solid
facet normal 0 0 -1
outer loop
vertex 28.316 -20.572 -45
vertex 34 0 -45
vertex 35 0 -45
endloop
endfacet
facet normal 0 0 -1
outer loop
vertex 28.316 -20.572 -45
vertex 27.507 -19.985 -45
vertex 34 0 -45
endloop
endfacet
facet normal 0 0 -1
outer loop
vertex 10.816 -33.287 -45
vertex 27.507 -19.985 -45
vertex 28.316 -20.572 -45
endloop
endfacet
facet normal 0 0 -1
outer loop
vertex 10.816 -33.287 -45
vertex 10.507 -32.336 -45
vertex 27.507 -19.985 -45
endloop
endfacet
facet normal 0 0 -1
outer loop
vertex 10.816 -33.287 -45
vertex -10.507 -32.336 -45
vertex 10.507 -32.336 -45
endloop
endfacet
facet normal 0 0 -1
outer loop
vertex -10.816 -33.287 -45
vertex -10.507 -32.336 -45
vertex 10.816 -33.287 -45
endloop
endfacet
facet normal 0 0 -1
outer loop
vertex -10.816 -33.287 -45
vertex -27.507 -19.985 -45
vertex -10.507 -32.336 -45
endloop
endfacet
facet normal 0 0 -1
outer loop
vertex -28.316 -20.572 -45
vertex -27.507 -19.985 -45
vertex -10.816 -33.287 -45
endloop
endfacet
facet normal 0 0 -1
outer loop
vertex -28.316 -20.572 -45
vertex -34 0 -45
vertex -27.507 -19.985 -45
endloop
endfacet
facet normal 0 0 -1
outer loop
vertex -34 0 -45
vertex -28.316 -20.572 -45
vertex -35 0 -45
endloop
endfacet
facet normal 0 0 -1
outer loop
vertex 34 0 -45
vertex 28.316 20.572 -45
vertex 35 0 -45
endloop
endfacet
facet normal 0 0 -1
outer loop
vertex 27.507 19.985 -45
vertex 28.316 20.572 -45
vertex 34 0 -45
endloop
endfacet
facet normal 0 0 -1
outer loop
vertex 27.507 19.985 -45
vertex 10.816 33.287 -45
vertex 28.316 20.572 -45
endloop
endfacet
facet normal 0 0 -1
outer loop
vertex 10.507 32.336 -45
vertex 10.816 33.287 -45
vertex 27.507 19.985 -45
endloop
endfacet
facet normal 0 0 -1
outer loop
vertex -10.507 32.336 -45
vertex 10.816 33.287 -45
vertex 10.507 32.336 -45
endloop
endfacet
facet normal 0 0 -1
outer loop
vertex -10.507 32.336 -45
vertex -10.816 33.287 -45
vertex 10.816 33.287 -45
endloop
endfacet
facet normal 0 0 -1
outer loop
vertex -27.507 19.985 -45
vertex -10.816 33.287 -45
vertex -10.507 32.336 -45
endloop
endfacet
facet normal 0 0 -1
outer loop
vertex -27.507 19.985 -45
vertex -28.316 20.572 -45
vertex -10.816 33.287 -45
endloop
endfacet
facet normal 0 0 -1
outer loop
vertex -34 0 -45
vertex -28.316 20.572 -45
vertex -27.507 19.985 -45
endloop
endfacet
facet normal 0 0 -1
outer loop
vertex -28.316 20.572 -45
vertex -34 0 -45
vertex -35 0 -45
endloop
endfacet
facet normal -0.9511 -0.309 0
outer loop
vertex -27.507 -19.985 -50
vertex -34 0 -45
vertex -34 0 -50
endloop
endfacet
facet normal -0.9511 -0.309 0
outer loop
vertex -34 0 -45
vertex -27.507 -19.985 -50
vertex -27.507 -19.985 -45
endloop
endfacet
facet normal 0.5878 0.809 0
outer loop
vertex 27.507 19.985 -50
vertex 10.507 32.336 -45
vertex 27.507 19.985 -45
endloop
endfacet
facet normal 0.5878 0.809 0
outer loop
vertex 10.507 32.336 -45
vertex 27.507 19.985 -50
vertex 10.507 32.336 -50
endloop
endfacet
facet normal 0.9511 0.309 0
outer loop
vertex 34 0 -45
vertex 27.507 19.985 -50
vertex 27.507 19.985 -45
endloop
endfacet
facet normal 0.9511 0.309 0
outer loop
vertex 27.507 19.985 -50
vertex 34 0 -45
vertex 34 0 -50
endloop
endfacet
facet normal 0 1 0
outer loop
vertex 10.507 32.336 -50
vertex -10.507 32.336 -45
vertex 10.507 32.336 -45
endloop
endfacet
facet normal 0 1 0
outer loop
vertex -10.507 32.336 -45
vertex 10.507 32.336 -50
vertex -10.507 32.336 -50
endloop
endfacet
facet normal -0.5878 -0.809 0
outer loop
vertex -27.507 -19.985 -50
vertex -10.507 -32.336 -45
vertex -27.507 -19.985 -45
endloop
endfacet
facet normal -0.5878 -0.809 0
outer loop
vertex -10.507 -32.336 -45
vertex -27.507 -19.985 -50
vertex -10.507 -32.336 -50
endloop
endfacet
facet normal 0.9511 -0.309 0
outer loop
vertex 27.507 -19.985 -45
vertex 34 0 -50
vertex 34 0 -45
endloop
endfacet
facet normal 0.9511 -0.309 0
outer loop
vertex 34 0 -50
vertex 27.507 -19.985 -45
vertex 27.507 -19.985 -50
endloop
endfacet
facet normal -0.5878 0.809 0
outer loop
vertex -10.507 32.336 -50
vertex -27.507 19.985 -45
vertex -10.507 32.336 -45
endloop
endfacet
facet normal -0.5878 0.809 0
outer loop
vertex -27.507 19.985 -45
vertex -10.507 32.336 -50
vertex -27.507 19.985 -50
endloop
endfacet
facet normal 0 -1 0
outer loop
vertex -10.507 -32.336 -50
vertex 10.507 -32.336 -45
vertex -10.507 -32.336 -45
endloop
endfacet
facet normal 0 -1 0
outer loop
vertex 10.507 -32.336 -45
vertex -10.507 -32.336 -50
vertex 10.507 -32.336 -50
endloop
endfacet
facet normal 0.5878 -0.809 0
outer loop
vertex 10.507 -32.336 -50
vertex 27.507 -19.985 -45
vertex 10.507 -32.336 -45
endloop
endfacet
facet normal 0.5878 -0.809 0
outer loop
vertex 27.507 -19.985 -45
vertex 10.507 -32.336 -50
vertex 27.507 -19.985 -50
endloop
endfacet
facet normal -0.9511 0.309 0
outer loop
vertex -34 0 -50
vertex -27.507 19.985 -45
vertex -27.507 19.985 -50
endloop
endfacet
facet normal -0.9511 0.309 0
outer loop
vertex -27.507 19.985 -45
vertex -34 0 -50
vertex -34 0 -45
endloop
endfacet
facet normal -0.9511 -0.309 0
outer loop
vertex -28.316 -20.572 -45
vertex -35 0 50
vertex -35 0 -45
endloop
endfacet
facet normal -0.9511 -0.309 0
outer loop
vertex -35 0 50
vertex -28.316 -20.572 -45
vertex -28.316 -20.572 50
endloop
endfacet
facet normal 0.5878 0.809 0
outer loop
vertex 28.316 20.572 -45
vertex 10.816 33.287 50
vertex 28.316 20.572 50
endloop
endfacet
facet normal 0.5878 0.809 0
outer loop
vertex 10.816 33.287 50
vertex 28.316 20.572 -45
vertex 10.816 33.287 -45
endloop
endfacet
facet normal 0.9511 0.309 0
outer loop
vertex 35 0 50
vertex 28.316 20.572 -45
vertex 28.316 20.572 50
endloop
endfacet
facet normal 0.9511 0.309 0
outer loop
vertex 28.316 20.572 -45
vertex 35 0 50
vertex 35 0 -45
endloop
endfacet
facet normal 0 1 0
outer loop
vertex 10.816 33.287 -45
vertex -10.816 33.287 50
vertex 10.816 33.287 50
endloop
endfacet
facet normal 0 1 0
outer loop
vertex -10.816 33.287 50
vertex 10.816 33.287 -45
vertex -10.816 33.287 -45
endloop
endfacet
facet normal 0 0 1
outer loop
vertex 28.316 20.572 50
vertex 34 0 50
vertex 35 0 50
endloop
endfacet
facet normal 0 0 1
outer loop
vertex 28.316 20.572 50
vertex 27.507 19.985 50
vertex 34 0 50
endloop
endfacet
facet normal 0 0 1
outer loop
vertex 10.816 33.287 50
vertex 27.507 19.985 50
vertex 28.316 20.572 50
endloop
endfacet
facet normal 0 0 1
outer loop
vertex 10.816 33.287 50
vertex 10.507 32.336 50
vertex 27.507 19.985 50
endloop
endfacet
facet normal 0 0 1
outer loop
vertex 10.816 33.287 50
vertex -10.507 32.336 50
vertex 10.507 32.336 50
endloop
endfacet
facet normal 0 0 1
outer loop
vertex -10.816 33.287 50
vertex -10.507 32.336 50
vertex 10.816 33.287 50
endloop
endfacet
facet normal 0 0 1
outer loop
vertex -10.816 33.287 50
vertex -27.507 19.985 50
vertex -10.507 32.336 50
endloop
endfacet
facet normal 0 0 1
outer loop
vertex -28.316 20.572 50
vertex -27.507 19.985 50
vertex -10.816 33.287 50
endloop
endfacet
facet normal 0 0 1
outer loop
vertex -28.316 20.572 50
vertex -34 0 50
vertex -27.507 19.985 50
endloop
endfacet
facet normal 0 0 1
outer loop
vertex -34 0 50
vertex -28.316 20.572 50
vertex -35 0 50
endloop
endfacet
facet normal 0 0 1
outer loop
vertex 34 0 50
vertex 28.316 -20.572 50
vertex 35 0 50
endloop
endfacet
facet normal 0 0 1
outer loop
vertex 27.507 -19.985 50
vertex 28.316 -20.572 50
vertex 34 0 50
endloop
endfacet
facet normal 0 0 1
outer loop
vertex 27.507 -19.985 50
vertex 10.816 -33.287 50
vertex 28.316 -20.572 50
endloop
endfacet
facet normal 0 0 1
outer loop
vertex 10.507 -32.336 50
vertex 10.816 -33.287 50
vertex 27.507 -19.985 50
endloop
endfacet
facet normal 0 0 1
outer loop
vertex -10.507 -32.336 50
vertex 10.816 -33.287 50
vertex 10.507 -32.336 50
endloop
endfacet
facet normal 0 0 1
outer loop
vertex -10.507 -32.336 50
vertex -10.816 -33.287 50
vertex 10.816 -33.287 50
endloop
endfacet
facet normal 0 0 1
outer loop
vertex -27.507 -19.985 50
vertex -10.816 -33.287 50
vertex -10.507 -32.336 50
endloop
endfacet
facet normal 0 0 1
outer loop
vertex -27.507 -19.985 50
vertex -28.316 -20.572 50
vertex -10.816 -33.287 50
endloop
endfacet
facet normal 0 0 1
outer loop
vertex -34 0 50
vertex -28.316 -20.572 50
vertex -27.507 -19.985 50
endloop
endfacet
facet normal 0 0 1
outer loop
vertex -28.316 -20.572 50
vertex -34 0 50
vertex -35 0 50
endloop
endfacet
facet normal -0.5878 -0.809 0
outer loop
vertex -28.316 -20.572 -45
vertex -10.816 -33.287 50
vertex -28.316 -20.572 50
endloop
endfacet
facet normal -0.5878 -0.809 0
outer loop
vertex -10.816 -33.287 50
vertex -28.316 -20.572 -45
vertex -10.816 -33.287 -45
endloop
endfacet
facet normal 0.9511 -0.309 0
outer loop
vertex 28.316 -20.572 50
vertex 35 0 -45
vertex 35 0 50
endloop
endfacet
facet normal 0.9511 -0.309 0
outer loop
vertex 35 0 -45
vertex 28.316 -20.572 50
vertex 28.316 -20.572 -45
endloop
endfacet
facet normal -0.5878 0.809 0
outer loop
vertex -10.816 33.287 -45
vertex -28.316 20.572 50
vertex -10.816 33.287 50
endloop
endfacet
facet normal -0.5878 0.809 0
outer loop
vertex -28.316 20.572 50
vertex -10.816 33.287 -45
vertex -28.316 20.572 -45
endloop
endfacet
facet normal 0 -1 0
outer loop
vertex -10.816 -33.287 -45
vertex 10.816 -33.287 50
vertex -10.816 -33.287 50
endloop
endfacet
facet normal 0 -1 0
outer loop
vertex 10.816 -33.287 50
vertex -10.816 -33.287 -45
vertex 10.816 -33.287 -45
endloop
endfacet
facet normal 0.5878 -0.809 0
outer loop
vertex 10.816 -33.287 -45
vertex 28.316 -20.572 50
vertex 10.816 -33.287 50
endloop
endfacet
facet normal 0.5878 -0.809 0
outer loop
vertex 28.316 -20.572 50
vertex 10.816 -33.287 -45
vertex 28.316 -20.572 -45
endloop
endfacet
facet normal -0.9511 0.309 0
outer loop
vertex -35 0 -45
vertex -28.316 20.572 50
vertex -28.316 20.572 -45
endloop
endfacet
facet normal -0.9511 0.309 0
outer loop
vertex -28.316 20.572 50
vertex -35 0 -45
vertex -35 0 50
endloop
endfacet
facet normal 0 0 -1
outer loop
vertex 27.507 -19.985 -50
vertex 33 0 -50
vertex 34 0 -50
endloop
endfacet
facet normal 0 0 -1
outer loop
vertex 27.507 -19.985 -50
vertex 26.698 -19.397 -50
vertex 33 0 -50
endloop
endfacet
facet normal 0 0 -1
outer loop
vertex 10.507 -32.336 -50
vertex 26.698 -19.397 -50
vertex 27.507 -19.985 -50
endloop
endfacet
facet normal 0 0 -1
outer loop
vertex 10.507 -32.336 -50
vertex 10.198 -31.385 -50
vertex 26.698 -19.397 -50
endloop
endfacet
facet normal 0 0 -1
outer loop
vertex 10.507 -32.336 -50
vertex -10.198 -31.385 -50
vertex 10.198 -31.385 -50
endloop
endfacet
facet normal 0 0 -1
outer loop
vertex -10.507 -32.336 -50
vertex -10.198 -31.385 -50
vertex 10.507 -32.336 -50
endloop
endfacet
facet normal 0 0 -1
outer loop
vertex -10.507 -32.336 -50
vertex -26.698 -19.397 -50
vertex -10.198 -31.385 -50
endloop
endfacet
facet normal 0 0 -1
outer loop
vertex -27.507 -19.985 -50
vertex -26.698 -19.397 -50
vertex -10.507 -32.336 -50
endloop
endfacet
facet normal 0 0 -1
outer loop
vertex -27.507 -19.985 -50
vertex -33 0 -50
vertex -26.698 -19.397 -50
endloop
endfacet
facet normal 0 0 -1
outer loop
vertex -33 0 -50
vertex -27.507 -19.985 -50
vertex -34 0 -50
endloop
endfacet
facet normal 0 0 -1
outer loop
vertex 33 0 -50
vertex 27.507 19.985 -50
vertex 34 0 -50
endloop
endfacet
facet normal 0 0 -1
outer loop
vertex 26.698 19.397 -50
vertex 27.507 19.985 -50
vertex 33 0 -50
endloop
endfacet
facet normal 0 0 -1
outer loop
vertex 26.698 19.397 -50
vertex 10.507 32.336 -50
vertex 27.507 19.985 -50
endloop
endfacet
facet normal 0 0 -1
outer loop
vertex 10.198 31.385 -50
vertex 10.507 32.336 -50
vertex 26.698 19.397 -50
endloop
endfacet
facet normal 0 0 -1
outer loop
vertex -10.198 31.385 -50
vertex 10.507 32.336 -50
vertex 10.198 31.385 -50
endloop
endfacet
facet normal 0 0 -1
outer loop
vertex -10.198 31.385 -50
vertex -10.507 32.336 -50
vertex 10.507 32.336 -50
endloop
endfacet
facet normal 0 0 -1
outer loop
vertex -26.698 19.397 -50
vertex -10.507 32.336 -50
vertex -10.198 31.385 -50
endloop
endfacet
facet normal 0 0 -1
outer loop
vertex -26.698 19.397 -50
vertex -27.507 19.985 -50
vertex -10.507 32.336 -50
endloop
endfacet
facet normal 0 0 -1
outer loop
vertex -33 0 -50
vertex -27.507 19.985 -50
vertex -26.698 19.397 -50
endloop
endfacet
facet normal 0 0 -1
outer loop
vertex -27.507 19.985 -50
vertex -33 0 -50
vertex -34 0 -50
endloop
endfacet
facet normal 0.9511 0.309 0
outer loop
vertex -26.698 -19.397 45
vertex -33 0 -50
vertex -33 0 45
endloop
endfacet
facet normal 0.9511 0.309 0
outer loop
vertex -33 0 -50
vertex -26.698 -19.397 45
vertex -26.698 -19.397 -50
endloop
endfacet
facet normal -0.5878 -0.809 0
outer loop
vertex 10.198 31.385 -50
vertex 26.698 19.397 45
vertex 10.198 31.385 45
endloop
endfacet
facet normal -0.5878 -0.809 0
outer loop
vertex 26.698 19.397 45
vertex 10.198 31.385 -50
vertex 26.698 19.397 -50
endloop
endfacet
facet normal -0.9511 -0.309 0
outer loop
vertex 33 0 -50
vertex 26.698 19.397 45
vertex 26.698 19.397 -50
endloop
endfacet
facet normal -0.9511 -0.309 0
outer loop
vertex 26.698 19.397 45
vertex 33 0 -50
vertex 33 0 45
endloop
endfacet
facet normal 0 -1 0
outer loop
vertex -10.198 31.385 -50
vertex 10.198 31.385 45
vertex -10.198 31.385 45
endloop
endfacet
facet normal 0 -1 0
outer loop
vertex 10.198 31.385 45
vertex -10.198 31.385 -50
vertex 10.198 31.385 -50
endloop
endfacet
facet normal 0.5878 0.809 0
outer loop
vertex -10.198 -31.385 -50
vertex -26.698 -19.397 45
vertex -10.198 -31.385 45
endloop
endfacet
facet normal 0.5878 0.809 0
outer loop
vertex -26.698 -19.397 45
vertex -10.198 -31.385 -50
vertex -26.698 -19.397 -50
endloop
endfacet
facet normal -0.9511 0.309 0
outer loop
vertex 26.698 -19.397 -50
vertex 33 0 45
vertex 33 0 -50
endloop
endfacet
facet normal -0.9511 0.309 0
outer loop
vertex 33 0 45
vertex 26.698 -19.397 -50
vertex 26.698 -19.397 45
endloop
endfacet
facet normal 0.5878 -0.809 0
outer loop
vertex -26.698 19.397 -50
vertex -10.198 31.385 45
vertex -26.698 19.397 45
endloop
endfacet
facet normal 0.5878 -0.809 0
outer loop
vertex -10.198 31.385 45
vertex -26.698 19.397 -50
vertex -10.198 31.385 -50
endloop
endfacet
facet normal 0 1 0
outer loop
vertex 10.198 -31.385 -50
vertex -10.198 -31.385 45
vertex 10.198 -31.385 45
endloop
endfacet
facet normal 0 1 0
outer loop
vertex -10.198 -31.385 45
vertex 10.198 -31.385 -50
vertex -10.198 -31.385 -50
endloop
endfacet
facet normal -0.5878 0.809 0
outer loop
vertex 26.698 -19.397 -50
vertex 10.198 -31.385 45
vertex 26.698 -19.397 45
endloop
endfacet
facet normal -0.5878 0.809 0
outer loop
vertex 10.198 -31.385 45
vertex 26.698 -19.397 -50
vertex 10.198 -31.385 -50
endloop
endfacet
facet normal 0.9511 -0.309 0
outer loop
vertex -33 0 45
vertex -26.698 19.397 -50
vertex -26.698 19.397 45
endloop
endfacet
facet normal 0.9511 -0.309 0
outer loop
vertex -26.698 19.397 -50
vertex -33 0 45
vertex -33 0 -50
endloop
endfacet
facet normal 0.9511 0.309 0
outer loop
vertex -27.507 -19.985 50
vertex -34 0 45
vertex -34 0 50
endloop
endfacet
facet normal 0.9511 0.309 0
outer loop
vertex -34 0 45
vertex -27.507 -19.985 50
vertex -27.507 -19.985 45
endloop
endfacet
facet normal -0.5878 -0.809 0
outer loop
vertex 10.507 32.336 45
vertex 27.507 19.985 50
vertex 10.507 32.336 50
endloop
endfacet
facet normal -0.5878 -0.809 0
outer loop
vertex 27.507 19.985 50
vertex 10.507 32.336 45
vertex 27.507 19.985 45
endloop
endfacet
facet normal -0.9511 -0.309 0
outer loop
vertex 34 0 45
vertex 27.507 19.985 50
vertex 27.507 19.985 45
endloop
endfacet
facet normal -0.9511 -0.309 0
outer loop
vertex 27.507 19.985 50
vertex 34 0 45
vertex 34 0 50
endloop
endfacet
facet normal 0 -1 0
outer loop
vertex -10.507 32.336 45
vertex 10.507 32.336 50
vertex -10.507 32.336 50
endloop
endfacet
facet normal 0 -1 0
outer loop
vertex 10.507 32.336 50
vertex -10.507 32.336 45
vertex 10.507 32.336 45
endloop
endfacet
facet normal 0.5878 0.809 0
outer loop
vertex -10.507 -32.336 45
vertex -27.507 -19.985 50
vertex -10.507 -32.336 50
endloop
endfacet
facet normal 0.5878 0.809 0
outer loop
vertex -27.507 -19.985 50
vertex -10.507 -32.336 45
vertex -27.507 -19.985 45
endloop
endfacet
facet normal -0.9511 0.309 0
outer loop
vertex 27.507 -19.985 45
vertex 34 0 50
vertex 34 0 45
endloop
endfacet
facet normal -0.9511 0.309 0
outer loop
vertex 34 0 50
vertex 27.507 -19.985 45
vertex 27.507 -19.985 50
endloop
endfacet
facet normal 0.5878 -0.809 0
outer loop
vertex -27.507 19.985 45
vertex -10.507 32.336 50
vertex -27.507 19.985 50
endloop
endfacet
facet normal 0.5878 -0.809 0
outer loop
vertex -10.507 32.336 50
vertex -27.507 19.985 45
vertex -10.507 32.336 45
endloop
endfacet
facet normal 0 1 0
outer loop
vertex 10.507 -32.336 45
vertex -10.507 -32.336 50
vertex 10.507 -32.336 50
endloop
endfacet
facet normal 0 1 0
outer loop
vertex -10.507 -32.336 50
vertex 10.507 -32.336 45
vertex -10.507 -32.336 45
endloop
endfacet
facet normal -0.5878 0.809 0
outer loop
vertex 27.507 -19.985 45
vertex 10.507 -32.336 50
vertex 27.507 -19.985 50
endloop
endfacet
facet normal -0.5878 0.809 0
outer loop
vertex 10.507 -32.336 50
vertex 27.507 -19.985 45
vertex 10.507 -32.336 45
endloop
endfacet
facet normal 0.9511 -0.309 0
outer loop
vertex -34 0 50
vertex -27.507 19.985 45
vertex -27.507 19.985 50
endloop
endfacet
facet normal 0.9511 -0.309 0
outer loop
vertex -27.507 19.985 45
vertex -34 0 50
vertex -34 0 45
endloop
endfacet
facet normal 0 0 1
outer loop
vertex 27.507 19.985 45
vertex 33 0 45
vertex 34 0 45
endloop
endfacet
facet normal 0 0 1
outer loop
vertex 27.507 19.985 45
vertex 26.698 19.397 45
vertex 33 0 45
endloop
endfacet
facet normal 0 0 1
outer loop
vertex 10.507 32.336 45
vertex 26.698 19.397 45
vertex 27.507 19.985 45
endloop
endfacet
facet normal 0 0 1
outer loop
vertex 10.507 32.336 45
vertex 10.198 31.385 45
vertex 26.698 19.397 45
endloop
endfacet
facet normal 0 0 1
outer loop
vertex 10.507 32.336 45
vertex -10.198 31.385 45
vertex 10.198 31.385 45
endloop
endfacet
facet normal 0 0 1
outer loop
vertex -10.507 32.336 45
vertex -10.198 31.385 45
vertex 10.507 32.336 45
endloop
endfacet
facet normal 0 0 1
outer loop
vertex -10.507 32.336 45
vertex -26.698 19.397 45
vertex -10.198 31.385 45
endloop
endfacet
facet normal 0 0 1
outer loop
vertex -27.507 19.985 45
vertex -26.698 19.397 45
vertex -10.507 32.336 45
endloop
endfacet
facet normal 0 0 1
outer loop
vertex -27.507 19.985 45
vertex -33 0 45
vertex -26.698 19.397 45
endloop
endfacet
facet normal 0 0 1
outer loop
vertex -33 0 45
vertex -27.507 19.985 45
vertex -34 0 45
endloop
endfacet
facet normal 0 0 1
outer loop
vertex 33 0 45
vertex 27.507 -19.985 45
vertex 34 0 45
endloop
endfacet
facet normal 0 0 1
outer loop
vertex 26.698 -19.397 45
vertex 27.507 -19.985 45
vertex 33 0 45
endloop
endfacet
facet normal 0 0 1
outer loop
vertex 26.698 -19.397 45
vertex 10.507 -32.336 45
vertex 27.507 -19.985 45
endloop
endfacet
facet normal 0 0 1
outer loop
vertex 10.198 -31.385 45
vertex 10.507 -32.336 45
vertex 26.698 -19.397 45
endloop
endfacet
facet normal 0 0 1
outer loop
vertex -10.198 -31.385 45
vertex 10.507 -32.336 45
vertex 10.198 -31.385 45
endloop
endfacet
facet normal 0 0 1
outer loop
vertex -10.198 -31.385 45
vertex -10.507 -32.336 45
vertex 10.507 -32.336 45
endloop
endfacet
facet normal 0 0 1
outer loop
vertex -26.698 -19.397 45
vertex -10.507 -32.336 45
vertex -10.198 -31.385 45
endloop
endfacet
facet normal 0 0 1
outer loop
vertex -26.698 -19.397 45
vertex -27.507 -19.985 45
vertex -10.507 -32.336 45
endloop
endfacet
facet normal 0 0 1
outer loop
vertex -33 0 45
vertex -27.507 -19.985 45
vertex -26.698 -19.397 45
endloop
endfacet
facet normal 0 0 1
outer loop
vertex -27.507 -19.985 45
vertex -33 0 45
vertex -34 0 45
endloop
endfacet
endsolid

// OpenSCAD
// file: x-way.scad
include<_variables.scad>;

// Parts
module main_body() {
    difference() {
        // Cylinder
        main_body_outer();
        main_body_inner();

        // Top joining
        translate([0, 0, $main_height/2]) cylinder(h = $joining_height, r = $joining_radius, center = true);

        // Bottom joining
        translate([0, 0, -$main_height/2])
        difference() {
            cylinder(h = $joining_height, r = $main_radius + 1, center = true);
            cylinder(h = $joining_height, r = $joining_radius, center = true);
        }
    }
}

module main_body_outer() {
    cylinder(h = $main_height, r = $main_radius, center = true);
}

module main_body_inner() {
    cylinder(h = $main_height + 1, r = $main_radius - $wall_thickness, center = true);
}

module tube_body(r, t) {
    difference() {
        difference() {
            tube_body_outer(r, t);
            tube_body_inner(r, t);
        }
        main_body_outer();
    }
}

module tube_body_outer(r, t) {
    translate(t) {
        rotate(r) {
            cylinder(h = $tube_height, r = $tube_radius, center = true);
        }
    }
}

module tube_body_inner(r, t) {
    translate(t) {
        rotate(r) {
            cylinder(h = $tube_height + 1, r = $tube_radius - $wall_thickness, center = true);
        }
    }
}

// Assembled modules

module xWay(count) {
    $max_angle = 180;
    $per_item = $max_angle / count;
    
    if(count > 0) {
        for (i = [0 : count - 1]) {
            rotate([0, 0, i * $per_item * 2]) tube_body([45, 0, 0], [0, -$main_radius, 0]);
        }
    }

    difference() {
        main_body();
        if(count > 0) {
            for (i = [0 : count - 1]) {
                rotate([0, 0, i * $per_item * 2]) tube_body_inner([45, 0, 0], [0, -$main_radius, 0]);
            }
        }
    }
}
// file: _variables.scad
/* [Render] */
$fa=1;
$fs=0.4;
$fn=10;
$show_helpers = false;

/* [General] */
$wall_thickness = 2;

/* [Main Body] */
$main_height = 100;
$main_radius = 35;
$joining_height = 10;
$joining_radius = $main_radius - $wall_thickness / 2;

/* [Tubes] */
$tube_height = $main_height / 2;
$tube_radius = $main_radius - 15;
$tube_hole_dimensions = 15;
$tube_hole_offset = 0;

/* [Cover] */
$hole_radius = $main_radius / 2.5;

/* [Planter] */
$stripes_count = 8;
$stripe_width = 5.0;
$planter_hole_radius = 2.5;

/* [Tray] */
$tray_thickness = 2.5;
$tray_hole_radius = 1;
$tray_radius = $main_radius - $wall_thickness;
$tray_holes_per_rotation = 4;
$tray_rotations = 16;

/* [Water Column] */
$water_column_radius = 5;
// main file
include<_variables.scad>;
use <x-way.scad>;

/*  Check settings ("customizer variables") in x-way.scad.
    The current config is pre-defined for a 150x150x150mm printing area.
    To tweak use one of the following:
    1. via OpenSCAD's Command-Line
        Use the `--D` flag to change variables.
        E.g. `--D $fn=100` to make the circles smooth.
    2. via OpenSCAD GUI
        Open this file and check the Customizer panel.
        In case the variables don't show up, proceed to the 3rd option.
    3. via an Editor (or OpenSCAD GUI)
        Open the file from above (`use <THIS FILE.scad>`) in either 
        an Editor or OpenSCAD GUI and change the variables in code
        or inside the Customizer. 
        Afterwards (re-)open this file in OpenSCAD and see the changes.

        Note: Editing the variables inside the code will affect ALL models
        depending on it. This can have advantages, but also disadvantages.
*/

// ---

xWay(0);
